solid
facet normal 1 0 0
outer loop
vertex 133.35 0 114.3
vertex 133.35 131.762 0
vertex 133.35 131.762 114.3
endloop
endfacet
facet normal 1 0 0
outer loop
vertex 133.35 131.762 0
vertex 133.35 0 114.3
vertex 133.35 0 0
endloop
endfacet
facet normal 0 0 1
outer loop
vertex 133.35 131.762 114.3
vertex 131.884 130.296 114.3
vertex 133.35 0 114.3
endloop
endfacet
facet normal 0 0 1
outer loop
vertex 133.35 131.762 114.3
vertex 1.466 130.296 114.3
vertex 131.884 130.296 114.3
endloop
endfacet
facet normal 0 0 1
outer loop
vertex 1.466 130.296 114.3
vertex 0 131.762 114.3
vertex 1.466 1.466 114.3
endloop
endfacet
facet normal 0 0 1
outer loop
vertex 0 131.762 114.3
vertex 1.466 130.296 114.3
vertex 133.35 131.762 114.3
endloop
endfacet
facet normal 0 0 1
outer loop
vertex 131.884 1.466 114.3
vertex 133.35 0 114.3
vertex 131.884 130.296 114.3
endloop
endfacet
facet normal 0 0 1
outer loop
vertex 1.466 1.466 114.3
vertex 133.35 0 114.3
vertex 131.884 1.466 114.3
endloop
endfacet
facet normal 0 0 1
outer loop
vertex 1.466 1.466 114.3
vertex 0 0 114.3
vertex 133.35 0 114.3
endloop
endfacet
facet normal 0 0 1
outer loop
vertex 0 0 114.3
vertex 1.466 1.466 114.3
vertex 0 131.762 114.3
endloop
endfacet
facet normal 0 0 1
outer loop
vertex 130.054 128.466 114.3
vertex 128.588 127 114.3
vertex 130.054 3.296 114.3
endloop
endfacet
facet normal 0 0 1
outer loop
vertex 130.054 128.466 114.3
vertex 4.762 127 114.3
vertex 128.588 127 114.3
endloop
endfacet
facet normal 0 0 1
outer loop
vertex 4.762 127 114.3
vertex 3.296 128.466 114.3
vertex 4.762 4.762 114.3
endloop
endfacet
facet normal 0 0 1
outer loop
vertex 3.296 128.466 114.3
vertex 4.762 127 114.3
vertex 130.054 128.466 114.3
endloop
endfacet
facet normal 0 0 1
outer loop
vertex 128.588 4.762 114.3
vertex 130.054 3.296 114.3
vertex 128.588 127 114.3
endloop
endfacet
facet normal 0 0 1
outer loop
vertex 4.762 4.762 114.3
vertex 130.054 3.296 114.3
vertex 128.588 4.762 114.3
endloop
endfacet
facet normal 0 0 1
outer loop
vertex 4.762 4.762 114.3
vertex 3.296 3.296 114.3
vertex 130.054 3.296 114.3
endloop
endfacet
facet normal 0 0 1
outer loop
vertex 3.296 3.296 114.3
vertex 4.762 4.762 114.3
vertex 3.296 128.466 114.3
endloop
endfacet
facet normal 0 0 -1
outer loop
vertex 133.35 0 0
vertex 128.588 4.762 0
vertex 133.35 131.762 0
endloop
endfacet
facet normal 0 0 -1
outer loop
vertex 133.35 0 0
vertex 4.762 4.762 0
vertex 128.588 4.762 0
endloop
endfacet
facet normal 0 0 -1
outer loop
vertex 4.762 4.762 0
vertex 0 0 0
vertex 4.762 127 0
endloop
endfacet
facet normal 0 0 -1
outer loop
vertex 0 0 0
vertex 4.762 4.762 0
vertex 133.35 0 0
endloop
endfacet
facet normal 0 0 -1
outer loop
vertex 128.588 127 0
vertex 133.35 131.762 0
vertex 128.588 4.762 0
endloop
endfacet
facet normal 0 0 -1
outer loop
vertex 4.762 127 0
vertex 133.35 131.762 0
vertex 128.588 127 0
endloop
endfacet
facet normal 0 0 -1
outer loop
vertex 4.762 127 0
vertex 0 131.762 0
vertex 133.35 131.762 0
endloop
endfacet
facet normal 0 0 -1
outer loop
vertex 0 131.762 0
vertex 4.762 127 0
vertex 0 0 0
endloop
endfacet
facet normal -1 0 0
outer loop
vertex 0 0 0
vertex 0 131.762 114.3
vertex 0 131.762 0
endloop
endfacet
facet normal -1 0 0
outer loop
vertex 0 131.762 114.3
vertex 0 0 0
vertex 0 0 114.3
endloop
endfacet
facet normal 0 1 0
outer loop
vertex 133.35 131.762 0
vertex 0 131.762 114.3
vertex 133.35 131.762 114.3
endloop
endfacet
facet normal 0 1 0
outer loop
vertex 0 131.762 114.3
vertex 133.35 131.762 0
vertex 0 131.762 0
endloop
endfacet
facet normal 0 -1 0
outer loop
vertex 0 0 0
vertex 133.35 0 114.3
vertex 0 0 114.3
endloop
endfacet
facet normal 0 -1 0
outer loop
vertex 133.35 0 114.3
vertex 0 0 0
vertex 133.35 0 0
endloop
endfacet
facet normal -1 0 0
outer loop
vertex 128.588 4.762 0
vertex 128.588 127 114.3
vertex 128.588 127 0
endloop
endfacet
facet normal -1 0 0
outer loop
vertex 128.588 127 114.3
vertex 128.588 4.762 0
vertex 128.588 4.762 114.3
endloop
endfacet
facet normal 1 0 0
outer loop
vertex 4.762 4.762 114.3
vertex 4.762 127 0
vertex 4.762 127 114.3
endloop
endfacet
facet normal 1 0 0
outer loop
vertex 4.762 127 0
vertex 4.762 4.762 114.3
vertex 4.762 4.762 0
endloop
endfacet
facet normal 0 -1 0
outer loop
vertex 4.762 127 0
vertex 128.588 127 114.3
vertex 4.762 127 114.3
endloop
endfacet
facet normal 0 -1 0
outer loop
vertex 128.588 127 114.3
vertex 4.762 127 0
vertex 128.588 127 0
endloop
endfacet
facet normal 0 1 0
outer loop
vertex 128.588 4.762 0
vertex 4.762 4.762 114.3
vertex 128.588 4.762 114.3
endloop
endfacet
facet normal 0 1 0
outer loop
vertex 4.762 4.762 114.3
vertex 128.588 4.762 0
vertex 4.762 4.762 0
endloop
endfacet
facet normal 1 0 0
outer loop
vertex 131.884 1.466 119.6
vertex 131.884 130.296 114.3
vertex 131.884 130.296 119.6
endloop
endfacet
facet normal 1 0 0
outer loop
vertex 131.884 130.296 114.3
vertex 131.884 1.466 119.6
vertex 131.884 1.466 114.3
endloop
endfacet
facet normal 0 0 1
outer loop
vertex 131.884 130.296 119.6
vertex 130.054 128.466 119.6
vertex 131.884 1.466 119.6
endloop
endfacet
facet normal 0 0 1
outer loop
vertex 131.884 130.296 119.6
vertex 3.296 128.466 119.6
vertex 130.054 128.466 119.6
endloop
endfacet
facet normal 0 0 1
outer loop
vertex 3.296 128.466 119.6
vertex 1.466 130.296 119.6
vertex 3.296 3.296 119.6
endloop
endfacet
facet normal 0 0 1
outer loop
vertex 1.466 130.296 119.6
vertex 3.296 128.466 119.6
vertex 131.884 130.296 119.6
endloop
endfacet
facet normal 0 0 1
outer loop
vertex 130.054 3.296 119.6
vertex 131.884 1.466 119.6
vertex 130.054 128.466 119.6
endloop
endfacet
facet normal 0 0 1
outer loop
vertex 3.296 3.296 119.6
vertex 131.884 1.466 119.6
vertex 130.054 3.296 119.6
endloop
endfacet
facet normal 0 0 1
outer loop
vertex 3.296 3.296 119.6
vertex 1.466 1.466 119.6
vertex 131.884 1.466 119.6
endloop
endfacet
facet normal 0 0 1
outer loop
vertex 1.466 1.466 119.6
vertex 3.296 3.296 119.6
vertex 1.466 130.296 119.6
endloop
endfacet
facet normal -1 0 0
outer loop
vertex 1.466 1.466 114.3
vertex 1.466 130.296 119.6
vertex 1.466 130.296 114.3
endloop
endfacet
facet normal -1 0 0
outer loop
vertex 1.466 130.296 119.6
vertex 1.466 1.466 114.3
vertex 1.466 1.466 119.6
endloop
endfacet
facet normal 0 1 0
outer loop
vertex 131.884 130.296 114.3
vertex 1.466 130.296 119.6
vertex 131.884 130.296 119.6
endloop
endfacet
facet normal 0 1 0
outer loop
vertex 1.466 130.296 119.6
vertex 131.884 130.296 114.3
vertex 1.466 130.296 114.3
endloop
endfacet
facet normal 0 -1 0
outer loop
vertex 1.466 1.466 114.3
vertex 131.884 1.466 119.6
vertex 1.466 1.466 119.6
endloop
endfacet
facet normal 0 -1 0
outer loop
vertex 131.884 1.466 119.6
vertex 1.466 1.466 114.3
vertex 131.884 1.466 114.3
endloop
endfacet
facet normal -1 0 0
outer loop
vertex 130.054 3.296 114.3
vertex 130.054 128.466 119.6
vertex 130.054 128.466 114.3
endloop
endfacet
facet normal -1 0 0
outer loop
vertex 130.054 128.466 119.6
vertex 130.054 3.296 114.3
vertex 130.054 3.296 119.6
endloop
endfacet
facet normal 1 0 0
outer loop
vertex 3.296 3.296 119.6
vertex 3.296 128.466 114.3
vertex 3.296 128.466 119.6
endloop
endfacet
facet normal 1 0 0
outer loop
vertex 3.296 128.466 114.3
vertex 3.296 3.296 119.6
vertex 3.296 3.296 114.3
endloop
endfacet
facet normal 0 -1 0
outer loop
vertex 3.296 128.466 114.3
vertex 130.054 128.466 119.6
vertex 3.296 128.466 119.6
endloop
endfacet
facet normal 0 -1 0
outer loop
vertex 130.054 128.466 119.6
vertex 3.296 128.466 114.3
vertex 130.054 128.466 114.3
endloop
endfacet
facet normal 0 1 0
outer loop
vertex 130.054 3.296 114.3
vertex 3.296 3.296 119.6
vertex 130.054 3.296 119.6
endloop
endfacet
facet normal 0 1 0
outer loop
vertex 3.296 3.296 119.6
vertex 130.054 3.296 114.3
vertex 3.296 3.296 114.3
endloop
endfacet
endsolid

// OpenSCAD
/* [Model Resolution (All dimensions are in Millimeters)] */
$fn = 256;

/* [Box Container Properties] */
Length = 133.35;
Width = 131.762;
Fit = .508; //.889(.035") is a good fit for most 
Height = 114.3;  //241.3
Wall_Thickness = 4.762;  // 4.762
Floor_Thickness = 6.3;

/* [Tab Properties] */
Tab_Width = 2.338;
Tab_Height = 6.3;

/* [Hidden] */
tab_width = Tab_Width - Fit;

Outside_Box();
Tab_Box();

module Outside_Box(){
  difference()
{   
    // Outside Dimensions
    cube([ 
        Length, 
        Width, 
        Height
    ],
         center = false);
    // Inside Dimensions
    translate([ 
        Wall_Thickness, 
        Wall_Thickness, 
       -1
    ])
        cube([ 
          Length-Wall_Thickness*2, 
          Width-Wall_Thickness*2, 
          Height+3
    ], 
          center = false);
    
};
}

module Tab_Box(){
    
 // Center tab in the  wall   
 wall_center = Wall_Thickness/2-tab_width/2;
    
// Tab Square
// Outside Dimensions
color("red"){
translate([
    wall_center,
    wall_center,
    Height-1,
    ]) {   
difference(){
cube([ 
        Length-wall_center*2, 
        Width-wall_center*2, 
        Tab_Height
    ],
         center = false
);
//Inside Dimensions
translate([
tab_width,
tab_width,
-1,
])
cube([
 Length-tab_width*2-wall_center*2, 
 Width-tab_width*2-wall_center*2, 
Tab_Height+3
],
center = false
); 
    
};
 };  
}; 
}
